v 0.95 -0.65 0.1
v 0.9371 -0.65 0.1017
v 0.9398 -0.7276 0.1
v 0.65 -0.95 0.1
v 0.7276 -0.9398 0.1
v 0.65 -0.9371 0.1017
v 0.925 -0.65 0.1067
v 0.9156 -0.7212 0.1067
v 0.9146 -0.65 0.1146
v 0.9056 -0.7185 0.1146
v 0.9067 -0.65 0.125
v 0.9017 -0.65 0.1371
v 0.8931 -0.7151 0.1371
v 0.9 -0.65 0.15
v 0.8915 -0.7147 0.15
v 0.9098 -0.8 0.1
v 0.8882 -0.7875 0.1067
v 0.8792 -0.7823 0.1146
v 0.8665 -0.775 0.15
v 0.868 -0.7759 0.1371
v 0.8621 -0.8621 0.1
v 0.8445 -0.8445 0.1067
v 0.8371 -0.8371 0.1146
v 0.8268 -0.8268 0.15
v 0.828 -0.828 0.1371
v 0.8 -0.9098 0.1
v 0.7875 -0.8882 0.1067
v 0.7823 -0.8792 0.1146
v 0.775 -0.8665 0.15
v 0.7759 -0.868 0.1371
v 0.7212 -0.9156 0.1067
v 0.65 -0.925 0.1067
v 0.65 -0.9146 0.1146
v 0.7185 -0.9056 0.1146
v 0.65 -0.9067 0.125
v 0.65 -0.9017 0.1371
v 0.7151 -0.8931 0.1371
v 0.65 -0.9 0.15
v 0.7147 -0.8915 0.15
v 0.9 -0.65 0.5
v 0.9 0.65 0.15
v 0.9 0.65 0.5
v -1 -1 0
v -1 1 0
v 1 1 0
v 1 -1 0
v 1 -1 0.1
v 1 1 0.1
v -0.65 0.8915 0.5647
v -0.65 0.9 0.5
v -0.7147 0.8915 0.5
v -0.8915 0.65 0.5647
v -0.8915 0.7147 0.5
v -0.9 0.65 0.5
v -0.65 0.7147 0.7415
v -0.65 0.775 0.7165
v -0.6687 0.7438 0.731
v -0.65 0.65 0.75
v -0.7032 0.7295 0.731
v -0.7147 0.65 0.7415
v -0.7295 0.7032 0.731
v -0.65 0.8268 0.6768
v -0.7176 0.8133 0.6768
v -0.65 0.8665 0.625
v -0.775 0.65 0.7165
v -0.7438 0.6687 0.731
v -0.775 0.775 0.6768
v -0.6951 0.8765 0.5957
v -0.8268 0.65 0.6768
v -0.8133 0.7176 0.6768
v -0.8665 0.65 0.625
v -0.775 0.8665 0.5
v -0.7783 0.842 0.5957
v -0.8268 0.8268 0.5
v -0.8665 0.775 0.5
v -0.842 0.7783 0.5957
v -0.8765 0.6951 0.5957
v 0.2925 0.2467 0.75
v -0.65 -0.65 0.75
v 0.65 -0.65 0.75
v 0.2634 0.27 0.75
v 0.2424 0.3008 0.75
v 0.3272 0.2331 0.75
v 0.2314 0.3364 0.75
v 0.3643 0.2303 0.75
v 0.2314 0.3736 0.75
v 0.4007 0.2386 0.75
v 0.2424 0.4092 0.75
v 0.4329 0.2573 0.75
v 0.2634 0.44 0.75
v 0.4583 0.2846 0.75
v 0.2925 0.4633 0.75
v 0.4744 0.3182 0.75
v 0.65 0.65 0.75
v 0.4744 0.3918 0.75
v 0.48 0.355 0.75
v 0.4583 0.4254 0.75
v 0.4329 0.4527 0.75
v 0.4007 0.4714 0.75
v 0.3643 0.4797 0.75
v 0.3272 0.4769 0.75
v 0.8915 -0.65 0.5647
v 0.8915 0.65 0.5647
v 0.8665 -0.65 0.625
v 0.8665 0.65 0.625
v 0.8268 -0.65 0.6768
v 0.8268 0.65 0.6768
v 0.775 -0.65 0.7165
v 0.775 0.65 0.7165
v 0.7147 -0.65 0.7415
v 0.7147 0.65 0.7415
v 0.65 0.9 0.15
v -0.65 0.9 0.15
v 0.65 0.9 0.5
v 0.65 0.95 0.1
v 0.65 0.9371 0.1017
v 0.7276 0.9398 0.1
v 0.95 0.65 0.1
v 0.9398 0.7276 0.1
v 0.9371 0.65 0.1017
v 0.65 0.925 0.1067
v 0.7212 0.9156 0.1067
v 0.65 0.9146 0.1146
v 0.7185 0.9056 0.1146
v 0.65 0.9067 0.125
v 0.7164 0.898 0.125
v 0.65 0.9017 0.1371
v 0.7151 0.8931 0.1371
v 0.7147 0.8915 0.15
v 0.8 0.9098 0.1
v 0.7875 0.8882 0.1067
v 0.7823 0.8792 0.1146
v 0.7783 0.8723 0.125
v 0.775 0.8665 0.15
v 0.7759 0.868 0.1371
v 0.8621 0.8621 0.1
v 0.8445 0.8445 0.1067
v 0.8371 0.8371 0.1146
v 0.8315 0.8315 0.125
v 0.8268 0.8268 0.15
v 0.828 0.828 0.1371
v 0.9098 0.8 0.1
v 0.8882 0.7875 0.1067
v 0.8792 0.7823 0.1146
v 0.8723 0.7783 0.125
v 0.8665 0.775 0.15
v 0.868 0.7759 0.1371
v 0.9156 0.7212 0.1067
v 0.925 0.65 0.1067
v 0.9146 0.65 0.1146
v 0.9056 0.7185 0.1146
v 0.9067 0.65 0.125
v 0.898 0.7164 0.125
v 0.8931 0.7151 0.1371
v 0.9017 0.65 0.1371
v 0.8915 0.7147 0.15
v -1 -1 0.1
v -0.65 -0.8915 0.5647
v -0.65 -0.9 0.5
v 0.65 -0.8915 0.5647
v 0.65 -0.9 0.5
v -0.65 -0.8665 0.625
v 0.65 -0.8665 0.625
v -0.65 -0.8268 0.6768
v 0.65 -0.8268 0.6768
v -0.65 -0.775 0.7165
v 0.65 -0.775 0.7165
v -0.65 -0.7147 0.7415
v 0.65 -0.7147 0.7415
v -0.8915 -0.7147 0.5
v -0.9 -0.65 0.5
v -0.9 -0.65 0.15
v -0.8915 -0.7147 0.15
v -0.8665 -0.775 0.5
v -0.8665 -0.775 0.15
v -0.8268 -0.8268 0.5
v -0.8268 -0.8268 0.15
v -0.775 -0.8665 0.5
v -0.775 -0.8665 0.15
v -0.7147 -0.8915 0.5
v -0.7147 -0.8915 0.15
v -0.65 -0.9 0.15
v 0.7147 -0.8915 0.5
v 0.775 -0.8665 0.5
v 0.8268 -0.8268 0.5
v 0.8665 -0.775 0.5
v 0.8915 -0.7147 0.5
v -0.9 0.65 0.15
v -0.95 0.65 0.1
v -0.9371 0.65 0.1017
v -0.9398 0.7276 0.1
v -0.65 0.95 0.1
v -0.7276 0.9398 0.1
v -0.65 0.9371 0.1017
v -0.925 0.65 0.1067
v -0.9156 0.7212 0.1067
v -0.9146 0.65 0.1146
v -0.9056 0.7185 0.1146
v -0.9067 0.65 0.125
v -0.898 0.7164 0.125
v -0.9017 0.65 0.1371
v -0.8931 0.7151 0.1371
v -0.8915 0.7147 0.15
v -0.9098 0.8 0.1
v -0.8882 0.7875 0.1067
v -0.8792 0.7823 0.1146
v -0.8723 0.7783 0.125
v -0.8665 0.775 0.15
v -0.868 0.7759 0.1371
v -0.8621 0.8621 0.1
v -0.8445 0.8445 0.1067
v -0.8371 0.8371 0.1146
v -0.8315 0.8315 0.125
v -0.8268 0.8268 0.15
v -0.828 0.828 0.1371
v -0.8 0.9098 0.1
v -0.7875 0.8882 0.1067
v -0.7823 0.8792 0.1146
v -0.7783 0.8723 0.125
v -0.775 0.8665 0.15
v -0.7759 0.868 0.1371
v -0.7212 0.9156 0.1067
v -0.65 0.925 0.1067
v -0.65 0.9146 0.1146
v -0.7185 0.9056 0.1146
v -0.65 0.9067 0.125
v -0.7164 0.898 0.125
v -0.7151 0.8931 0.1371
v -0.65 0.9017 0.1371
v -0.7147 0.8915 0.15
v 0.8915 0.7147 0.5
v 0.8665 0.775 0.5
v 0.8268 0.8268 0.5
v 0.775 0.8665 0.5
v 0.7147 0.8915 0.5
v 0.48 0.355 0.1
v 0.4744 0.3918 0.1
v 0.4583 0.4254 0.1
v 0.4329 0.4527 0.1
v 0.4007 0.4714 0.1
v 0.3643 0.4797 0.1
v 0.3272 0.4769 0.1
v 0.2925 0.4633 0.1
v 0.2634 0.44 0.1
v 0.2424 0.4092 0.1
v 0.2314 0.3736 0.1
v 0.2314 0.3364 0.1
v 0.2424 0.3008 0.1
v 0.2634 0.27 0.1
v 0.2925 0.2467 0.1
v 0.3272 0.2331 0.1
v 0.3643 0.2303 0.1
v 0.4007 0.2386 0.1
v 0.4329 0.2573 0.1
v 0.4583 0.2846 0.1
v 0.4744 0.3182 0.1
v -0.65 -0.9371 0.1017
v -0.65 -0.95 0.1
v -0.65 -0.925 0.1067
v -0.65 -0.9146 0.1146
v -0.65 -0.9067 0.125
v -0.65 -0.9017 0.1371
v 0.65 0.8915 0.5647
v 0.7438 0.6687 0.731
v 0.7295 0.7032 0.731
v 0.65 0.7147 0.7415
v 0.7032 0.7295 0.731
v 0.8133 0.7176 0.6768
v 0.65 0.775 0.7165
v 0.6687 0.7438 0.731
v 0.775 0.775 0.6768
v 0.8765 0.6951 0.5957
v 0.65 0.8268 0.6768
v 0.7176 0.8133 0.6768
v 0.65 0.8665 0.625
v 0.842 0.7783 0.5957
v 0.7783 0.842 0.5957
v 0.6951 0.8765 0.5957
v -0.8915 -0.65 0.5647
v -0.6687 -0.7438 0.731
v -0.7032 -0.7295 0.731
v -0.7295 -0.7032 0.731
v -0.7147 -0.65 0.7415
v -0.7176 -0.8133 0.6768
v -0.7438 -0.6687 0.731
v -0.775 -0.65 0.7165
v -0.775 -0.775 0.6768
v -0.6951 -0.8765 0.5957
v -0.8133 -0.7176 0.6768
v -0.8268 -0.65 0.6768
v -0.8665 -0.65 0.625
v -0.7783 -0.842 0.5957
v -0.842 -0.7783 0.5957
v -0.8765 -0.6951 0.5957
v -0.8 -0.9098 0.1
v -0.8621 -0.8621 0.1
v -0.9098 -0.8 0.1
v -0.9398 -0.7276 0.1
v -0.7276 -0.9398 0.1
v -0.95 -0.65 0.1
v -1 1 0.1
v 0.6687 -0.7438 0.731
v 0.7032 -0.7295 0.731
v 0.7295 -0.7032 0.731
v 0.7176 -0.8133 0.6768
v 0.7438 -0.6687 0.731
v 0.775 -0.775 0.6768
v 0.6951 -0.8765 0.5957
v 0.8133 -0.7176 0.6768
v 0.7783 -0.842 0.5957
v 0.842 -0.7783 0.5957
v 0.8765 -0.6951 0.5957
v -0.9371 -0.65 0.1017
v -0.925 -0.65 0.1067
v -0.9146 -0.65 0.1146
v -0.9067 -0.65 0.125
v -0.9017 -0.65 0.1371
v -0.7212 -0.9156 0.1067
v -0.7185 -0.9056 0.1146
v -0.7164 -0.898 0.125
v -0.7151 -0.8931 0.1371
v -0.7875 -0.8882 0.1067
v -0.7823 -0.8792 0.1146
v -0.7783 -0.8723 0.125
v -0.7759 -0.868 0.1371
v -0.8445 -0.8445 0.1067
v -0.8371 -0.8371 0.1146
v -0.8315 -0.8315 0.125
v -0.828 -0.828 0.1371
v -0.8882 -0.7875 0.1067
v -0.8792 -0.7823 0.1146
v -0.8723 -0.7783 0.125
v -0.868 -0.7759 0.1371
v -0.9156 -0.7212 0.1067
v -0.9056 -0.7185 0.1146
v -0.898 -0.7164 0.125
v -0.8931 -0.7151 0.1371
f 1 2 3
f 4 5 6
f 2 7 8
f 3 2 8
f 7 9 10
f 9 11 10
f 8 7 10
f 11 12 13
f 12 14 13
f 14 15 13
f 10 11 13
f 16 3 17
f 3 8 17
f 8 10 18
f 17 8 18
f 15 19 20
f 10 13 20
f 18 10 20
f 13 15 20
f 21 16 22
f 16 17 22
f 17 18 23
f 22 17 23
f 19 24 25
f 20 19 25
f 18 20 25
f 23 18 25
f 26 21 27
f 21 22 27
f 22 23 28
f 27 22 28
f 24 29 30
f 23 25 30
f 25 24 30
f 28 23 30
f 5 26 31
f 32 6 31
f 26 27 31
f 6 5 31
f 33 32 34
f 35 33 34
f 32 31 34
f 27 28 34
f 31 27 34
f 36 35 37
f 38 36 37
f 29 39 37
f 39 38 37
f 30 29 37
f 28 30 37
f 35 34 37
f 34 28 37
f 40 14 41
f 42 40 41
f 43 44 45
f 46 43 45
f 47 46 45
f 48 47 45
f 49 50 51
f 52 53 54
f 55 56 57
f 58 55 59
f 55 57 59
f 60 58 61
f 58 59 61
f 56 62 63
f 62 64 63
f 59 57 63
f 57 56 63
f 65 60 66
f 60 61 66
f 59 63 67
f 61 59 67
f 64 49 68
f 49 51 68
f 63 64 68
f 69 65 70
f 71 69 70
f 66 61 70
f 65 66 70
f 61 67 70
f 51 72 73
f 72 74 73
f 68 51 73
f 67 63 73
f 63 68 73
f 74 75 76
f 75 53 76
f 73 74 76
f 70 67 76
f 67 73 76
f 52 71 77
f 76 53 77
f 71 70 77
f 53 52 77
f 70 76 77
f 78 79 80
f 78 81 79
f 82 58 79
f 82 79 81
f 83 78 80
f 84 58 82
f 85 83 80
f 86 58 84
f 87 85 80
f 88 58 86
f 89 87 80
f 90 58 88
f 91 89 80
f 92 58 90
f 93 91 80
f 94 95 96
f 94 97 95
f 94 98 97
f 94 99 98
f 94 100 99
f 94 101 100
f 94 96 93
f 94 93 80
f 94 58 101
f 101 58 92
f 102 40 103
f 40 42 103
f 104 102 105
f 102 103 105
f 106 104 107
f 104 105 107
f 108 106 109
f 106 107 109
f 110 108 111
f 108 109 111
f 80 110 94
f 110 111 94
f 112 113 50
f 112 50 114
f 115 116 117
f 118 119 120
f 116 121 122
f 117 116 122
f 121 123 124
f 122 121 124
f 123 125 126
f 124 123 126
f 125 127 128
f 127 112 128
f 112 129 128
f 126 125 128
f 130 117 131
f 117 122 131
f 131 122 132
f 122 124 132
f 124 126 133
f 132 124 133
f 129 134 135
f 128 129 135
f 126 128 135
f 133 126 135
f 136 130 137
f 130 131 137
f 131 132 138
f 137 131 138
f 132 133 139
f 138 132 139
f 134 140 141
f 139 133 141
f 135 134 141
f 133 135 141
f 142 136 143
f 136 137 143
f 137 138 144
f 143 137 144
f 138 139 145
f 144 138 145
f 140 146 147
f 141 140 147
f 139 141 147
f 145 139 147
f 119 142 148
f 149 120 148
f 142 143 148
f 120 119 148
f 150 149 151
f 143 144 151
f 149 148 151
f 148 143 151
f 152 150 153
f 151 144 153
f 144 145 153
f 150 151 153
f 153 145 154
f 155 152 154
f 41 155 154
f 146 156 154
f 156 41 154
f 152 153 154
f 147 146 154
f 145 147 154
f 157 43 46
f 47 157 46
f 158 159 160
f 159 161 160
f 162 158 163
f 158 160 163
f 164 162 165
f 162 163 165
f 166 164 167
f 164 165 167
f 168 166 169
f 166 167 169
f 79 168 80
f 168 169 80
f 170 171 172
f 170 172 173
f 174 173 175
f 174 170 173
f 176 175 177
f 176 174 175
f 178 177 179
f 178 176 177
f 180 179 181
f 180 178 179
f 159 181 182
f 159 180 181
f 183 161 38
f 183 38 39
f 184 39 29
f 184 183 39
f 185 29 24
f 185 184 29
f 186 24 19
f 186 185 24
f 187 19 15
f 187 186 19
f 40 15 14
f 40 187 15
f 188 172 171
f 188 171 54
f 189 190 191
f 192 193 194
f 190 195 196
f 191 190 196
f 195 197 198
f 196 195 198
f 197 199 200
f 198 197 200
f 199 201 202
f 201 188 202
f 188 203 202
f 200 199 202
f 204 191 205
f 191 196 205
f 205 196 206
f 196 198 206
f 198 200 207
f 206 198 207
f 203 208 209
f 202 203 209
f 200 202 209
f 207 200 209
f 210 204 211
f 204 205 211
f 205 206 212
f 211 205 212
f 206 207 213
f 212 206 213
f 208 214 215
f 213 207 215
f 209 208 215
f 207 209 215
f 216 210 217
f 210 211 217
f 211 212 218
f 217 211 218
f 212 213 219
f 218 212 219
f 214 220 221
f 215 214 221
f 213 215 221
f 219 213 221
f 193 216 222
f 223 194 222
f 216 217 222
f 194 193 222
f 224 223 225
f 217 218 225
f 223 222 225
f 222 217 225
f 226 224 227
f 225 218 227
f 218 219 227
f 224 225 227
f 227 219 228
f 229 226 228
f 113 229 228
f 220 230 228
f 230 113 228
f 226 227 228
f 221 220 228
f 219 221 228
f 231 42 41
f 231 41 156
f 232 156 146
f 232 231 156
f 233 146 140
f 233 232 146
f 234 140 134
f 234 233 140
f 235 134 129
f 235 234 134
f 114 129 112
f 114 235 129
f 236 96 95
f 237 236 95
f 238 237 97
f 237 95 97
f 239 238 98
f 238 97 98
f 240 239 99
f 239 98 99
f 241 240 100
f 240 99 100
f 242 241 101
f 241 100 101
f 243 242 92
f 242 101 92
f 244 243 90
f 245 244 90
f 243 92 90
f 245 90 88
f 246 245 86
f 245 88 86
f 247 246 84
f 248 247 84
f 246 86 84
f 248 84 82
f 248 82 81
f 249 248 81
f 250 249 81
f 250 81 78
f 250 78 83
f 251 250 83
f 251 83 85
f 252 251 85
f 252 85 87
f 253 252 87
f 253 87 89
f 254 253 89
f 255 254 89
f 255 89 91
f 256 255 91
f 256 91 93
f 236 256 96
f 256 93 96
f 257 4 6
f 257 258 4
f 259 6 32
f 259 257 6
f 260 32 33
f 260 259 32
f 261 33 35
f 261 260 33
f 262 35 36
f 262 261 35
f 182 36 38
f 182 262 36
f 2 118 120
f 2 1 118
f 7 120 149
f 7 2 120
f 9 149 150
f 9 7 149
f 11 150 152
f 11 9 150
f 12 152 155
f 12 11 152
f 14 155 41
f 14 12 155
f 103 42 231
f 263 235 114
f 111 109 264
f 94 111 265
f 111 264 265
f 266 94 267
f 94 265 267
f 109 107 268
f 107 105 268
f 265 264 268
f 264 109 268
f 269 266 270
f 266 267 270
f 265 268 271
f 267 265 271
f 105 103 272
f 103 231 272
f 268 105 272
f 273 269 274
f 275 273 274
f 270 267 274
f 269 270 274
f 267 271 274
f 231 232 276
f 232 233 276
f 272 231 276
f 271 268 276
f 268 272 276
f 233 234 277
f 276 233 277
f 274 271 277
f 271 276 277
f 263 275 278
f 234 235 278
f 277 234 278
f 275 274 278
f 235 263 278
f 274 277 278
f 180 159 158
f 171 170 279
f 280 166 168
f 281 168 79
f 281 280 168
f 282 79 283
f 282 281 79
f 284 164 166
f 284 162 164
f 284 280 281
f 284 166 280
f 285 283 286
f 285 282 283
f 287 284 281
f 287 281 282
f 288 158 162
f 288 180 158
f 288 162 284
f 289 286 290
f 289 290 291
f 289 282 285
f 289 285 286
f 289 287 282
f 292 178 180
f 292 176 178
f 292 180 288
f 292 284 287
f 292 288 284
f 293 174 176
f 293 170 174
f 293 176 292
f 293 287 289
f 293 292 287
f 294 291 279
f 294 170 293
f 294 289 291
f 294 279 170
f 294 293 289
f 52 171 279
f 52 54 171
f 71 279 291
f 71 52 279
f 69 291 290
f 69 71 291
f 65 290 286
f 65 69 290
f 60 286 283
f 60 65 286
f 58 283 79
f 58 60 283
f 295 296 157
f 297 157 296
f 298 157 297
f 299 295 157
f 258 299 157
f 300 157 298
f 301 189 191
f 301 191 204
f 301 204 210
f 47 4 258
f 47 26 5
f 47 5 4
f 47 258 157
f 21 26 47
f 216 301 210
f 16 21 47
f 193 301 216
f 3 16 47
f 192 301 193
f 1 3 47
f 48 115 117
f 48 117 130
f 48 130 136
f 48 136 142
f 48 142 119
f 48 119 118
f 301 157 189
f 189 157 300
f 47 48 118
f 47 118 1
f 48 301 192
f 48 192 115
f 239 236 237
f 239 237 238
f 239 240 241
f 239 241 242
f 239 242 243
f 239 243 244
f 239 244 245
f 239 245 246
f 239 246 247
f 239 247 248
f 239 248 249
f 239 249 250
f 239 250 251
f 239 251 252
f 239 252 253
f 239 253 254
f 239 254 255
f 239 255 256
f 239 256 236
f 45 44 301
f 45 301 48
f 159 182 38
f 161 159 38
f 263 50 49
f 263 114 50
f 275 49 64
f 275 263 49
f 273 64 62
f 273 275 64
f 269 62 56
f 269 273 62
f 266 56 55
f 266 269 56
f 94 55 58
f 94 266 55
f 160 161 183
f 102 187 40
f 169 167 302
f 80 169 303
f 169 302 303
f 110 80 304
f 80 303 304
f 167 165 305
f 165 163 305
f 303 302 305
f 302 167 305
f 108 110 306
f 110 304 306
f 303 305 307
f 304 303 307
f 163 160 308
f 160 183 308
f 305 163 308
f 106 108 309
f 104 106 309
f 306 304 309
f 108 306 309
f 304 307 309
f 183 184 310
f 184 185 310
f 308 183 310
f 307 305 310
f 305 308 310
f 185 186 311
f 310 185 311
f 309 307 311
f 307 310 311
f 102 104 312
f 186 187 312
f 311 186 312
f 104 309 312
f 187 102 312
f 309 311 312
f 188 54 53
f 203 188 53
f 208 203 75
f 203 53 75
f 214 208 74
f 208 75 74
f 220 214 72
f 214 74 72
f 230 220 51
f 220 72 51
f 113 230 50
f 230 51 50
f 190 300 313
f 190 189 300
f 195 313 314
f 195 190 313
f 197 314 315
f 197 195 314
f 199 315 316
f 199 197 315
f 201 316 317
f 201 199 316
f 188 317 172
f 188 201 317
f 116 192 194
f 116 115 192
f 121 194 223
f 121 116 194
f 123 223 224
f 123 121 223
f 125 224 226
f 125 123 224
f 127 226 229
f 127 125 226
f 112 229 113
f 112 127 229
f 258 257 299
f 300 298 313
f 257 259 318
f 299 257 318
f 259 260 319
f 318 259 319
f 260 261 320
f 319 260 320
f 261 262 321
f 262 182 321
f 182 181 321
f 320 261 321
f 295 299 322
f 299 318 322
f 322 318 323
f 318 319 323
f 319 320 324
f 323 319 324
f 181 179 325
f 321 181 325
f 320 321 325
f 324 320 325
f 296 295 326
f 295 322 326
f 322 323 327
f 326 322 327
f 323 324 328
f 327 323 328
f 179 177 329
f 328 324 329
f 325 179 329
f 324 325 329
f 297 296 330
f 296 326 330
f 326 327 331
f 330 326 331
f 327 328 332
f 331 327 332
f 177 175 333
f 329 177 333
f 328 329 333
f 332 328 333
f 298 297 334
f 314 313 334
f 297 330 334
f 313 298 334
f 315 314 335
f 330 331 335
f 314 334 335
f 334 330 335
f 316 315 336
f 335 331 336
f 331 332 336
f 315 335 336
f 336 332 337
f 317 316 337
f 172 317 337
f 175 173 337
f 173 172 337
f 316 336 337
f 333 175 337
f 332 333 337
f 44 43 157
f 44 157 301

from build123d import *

# Parameters (mm, degrees)
ESQUISSE1_W   = 2
ESQUISSE1_H   = 2
SEMELLE_DEPTH = 0.1
ESQUISSE2_W   = 1.8
ESQUISSE2_H   = 1.8
CORP_DEPTH    = 0.75
ESQUISSE3_R   = 0.125
EVENT_DEPTH   = 0.65
CONGE_TOP_R   = 0.25
CONG_BASE_R   = 0.05


with BuildPart() as part:
    # Esquisse1 → semelle (new body)
    with BuildSketch(Plane.XY):
        Rectangle(ESQUISSE1_W, ESQUISSE1_H)
    extrude(amount=SEMELLE_DEPTH)

    # Esquisse2 → corp (add)
    with BuildSketch(Plane.XY):
        Rectangle(ESQUISSE2_W, ESQUISSE2_H)
    extrude(amount=CORP_DEPTH)

    # Esquisse3 → event (cut)
    with BuildSketch(Plane.XY.offset(0.75)):
        with Locations((0.355, 0.355)):
            Circle(ESQUISSE3_R)
    extrude(amount=-EVENT_DEPTH, mode=Mode.SUBTRACT)

    # conge top
    conge_top_edges = [part.edges().sort_by_distance(p)[0] for p in [
        (-0.9, -0.9, 0.425),
        (0.9, -0.9, 0.425),
        (0.9, 0.9, 0.425),
        (-0.9, 0.9, 0.425),
        (0, -0.9, 0.75),
        (0.9, 0, 0.75),
        (0, 0.9, 0.75),
        (-0.9, 0, 0.75),
    ]]
    fillet(conge_top_edges, radius=CONGE_TOP_R)

    # Congé base
    cong_base_edges = [part.edges().sort_by_distance(p)[0] for p in [
        (0, -0.9, 0.1),
        (0.9, 0, 0.1),
        (0, 0.9, 0.1),
        (-0.9, 0, 0.1),
        (-0.826776695, 0.826776695, 0.1),
        (-0.826776695, -0.826776695, 0.1),
        (0.826776695, 0.826776695, 0.1),
        (0.826776695, -0.826776695, 0.1),
    ]]
    fillet(cong_base_edges, radius=CONG_BASE_R)


solid = part.part
